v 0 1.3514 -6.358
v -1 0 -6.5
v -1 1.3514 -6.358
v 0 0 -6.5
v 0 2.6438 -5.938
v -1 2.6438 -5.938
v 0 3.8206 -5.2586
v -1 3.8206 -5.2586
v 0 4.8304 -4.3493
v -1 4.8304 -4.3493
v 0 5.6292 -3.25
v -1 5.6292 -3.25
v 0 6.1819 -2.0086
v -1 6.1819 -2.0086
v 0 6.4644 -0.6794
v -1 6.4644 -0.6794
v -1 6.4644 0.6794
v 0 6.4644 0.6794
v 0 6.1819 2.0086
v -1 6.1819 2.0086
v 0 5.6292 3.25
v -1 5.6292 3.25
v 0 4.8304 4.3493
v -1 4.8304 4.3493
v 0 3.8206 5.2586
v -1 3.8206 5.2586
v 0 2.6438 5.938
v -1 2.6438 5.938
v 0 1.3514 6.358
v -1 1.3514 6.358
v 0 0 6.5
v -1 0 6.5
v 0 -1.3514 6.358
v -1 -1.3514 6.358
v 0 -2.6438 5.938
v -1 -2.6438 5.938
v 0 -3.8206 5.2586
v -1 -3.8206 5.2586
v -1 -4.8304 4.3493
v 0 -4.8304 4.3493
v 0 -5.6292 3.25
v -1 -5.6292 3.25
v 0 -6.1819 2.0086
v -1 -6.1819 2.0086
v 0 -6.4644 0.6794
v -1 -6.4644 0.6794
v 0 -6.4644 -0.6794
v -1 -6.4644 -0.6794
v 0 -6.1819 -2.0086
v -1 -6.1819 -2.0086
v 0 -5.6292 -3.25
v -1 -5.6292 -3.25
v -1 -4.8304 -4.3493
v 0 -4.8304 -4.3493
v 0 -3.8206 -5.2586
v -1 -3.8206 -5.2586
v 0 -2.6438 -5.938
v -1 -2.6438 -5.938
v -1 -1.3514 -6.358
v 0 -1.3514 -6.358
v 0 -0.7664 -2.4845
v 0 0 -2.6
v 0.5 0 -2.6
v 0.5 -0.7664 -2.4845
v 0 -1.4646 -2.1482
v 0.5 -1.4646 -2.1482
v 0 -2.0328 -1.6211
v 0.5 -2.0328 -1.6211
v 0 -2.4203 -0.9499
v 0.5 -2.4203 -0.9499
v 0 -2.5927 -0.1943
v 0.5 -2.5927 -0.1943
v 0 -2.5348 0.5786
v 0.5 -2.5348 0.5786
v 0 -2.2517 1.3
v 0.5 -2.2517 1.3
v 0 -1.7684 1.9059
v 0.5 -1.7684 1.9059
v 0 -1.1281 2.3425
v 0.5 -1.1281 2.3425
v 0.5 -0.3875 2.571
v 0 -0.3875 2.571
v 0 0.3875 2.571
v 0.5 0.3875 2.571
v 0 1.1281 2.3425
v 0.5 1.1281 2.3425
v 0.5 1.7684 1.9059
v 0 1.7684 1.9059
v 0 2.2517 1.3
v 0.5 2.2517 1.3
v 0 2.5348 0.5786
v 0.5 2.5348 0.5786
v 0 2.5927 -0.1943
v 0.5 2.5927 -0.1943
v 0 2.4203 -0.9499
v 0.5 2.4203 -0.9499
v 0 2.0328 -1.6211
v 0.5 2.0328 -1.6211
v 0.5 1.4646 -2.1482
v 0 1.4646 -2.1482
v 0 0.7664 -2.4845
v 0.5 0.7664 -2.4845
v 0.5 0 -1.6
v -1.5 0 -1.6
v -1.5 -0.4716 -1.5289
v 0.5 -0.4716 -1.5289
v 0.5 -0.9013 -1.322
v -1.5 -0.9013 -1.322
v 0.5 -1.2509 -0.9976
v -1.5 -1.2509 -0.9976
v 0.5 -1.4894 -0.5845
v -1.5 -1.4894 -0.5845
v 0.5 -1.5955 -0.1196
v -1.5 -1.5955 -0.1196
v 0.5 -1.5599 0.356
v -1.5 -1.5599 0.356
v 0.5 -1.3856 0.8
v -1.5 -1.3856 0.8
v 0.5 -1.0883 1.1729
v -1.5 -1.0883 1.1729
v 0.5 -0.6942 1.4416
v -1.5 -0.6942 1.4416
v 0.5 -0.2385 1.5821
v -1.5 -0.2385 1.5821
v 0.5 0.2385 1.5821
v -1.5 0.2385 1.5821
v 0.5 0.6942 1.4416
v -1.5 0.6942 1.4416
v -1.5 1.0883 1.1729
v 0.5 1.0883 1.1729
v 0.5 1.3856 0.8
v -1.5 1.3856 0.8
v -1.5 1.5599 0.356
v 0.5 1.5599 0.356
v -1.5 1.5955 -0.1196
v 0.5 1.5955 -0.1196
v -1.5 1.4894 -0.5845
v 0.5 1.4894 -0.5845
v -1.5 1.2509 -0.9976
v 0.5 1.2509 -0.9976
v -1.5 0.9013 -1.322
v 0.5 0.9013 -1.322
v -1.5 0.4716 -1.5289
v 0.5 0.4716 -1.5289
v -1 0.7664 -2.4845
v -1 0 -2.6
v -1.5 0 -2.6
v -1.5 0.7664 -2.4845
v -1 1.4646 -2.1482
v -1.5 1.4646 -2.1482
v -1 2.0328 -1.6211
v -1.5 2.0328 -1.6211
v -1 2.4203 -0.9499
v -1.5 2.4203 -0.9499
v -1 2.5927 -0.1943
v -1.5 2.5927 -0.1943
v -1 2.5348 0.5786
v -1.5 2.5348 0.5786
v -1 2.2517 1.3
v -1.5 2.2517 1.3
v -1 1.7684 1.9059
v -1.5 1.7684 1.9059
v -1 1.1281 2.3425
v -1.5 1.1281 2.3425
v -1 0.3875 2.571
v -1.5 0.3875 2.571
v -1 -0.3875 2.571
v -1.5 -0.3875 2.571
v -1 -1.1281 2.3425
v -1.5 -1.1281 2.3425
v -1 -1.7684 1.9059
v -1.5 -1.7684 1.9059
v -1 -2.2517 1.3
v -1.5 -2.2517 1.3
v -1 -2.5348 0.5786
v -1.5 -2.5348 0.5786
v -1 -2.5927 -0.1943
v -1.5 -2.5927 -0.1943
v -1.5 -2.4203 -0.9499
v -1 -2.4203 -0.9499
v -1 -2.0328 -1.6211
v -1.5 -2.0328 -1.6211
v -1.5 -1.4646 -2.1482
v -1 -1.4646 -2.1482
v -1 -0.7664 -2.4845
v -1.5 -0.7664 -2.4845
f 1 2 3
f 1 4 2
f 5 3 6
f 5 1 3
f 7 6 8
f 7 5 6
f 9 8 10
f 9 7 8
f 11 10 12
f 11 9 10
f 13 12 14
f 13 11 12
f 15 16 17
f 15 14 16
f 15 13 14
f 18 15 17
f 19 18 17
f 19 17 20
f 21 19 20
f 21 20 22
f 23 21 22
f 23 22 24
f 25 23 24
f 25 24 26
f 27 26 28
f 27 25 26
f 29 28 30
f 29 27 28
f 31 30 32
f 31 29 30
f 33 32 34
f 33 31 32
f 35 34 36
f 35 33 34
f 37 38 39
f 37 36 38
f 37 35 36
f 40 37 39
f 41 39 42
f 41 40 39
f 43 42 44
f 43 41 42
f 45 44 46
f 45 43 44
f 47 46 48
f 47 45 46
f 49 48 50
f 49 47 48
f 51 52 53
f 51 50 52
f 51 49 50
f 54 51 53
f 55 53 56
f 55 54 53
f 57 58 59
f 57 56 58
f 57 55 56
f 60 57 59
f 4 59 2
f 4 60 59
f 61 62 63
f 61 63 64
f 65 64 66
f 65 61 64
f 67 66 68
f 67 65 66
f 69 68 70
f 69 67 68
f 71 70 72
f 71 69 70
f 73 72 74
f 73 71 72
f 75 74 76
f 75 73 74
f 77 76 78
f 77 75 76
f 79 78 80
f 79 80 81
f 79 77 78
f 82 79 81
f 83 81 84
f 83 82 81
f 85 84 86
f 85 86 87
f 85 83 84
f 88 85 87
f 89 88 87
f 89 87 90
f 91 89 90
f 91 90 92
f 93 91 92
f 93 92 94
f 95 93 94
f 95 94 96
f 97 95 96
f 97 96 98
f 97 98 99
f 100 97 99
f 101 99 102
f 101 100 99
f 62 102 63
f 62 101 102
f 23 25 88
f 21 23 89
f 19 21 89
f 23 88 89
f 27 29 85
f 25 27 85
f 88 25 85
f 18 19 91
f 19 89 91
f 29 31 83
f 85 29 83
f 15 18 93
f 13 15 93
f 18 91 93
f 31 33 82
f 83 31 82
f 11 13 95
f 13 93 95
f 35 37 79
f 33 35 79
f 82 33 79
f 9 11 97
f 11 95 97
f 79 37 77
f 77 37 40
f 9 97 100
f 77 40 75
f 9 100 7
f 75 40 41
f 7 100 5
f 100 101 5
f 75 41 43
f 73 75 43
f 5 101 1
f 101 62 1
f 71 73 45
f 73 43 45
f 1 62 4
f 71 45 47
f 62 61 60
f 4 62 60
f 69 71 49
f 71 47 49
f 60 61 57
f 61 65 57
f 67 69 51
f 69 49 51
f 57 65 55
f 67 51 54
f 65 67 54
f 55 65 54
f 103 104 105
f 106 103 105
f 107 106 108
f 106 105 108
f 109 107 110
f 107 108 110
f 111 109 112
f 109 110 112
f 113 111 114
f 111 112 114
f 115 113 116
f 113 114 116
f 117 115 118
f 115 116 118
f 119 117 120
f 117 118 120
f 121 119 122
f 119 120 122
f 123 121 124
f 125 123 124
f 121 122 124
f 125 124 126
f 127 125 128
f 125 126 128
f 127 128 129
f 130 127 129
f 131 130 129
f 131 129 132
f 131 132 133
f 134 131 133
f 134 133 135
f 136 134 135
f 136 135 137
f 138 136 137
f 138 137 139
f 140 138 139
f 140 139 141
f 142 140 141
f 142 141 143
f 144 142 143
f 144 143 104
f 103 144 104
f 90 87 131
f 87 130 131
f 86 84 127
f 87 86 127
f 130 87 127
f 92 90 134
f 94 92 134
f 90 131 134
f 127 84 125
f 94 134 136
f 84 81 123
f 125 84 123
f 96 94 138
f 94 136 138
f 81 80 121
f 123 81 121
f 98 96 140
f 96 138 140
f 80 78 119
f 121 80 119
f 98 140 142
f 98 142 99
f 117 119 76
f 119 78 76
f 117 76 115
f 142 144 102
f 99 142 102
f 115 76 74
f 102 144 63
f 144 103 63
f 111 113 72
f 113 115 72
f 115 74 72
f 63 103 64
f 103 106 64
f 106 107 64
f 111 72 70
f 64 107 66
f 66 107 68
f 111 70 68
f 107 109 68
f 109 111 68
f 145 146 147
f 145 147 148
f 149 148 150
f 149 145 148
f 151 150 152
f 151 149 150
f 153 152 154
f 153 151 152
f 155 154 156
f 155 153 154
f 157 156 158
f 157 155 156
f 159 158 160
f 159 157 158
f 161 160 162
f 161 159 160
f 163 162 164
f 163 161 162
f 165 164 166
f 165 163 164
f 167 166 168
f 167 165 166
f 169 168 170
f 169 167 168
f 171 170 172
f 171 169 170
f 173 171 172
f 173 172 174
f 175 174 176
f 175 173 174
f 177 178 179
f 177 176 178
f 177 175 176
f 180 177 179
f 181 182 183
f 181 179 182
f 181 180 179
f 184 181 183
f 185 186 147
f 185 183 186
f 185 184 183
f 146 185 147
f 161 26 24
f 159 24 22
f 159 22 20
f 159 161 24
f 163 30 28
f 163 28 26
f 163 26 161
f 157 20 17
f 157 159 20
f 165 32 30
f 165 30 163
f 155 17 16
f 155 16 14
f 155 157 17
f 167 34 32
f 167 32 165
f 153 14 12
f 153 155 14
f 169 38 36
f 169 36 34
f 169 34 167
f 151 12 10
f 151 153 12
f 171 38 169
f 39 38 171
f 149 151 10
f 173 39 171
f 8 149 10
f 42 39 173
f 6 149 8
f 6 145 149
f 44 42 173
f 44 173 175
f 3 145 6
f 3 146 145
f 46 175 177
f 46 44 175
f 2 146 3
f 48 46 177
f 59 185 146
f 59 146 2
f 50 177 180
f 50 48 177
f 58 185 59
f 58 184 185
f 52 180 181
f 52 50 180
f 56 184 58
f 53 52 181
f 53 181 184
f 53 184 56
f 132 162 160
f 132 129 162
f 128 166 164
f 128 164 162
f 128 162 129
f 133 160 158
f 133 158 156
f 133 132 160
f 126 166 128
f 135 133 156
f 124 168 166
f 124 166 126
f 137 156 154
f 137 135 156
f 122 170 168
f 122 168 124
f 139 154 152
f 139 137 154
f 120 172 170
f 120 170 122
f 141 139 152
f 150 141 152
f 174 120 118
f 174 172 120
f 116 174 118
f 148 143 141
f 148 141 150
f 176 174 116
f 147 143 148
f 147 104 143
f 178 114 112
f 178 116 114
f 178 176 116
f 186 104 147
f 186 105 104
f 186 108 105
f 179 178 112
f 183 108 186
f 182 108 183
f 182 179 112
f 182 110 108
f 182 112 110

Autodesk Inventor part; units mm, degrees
ref_plane "YZ Plane" through (0, 0, 0) normal (1, 0, 0) x (0, 1, 0)
ref_plane "XZ Plane" through (0, 0, 0) normal (0, 1, 0) x (-1, 0, 0)
ref_plane "XY Plane" through (0, 0, 0) normal (0, 0, 1) x (1, 0, 0)
sketch "Sketch1" plane through (0, 0, 0) normal (0, 1, 0) x (-1, 0, 0)
  line L0 (0, 0) -> (1, 0)
  line L1 (1, 0) -> (1, -6.5)
  line L2 (1, -6.5) -> (0, -6.5)
  line L3 (0, -6.5) -> (0, 0)
  line L4 (1, 0) -> (0, 0)
  line L5 (0, 0) -> (0, -1.6)
  line L6 (0, -1.6) -> (1, -1.6)
  line L7 (1, -1.6) -> (1, 0)
  line L8 (1, -1.6) -> (1.5, -1.6)
  line L9 (1.5, -1.6) -> (1.5, -2.6)
  line L10 (1.5, -2.6) -> (1, -2.6)
  line L11 (1, -2.6) -> (1, -1.6)
  line L12 (0, -1.6) -> (-0.5, -1.6)
  line L13 (-0.5, -1.6) -> (-0.5, -2.6)
  line L14 (-0.5, -2.6) -> (0, -2.6)
  line L15 (0, -2.6) -> (0, -1.6)
  dimension "d0" = 1
  dimension "d1" = 6.5
  dimension "d2" = 1.6
  dimension "d3" = 0.5
  dimension "d4" = 1
  dimension "d5" = 0.5
  dimension "d6" = 1
revolve "Revolution1" add sketch "Sketch1" angle 360 about axis through (0, 0, 0) along (-1, 0, 0) contours L6 L1 L2 L3 | L3 L14 L13 L12 | L8 L9 L10 L1
properties part number "idler_spacer"
